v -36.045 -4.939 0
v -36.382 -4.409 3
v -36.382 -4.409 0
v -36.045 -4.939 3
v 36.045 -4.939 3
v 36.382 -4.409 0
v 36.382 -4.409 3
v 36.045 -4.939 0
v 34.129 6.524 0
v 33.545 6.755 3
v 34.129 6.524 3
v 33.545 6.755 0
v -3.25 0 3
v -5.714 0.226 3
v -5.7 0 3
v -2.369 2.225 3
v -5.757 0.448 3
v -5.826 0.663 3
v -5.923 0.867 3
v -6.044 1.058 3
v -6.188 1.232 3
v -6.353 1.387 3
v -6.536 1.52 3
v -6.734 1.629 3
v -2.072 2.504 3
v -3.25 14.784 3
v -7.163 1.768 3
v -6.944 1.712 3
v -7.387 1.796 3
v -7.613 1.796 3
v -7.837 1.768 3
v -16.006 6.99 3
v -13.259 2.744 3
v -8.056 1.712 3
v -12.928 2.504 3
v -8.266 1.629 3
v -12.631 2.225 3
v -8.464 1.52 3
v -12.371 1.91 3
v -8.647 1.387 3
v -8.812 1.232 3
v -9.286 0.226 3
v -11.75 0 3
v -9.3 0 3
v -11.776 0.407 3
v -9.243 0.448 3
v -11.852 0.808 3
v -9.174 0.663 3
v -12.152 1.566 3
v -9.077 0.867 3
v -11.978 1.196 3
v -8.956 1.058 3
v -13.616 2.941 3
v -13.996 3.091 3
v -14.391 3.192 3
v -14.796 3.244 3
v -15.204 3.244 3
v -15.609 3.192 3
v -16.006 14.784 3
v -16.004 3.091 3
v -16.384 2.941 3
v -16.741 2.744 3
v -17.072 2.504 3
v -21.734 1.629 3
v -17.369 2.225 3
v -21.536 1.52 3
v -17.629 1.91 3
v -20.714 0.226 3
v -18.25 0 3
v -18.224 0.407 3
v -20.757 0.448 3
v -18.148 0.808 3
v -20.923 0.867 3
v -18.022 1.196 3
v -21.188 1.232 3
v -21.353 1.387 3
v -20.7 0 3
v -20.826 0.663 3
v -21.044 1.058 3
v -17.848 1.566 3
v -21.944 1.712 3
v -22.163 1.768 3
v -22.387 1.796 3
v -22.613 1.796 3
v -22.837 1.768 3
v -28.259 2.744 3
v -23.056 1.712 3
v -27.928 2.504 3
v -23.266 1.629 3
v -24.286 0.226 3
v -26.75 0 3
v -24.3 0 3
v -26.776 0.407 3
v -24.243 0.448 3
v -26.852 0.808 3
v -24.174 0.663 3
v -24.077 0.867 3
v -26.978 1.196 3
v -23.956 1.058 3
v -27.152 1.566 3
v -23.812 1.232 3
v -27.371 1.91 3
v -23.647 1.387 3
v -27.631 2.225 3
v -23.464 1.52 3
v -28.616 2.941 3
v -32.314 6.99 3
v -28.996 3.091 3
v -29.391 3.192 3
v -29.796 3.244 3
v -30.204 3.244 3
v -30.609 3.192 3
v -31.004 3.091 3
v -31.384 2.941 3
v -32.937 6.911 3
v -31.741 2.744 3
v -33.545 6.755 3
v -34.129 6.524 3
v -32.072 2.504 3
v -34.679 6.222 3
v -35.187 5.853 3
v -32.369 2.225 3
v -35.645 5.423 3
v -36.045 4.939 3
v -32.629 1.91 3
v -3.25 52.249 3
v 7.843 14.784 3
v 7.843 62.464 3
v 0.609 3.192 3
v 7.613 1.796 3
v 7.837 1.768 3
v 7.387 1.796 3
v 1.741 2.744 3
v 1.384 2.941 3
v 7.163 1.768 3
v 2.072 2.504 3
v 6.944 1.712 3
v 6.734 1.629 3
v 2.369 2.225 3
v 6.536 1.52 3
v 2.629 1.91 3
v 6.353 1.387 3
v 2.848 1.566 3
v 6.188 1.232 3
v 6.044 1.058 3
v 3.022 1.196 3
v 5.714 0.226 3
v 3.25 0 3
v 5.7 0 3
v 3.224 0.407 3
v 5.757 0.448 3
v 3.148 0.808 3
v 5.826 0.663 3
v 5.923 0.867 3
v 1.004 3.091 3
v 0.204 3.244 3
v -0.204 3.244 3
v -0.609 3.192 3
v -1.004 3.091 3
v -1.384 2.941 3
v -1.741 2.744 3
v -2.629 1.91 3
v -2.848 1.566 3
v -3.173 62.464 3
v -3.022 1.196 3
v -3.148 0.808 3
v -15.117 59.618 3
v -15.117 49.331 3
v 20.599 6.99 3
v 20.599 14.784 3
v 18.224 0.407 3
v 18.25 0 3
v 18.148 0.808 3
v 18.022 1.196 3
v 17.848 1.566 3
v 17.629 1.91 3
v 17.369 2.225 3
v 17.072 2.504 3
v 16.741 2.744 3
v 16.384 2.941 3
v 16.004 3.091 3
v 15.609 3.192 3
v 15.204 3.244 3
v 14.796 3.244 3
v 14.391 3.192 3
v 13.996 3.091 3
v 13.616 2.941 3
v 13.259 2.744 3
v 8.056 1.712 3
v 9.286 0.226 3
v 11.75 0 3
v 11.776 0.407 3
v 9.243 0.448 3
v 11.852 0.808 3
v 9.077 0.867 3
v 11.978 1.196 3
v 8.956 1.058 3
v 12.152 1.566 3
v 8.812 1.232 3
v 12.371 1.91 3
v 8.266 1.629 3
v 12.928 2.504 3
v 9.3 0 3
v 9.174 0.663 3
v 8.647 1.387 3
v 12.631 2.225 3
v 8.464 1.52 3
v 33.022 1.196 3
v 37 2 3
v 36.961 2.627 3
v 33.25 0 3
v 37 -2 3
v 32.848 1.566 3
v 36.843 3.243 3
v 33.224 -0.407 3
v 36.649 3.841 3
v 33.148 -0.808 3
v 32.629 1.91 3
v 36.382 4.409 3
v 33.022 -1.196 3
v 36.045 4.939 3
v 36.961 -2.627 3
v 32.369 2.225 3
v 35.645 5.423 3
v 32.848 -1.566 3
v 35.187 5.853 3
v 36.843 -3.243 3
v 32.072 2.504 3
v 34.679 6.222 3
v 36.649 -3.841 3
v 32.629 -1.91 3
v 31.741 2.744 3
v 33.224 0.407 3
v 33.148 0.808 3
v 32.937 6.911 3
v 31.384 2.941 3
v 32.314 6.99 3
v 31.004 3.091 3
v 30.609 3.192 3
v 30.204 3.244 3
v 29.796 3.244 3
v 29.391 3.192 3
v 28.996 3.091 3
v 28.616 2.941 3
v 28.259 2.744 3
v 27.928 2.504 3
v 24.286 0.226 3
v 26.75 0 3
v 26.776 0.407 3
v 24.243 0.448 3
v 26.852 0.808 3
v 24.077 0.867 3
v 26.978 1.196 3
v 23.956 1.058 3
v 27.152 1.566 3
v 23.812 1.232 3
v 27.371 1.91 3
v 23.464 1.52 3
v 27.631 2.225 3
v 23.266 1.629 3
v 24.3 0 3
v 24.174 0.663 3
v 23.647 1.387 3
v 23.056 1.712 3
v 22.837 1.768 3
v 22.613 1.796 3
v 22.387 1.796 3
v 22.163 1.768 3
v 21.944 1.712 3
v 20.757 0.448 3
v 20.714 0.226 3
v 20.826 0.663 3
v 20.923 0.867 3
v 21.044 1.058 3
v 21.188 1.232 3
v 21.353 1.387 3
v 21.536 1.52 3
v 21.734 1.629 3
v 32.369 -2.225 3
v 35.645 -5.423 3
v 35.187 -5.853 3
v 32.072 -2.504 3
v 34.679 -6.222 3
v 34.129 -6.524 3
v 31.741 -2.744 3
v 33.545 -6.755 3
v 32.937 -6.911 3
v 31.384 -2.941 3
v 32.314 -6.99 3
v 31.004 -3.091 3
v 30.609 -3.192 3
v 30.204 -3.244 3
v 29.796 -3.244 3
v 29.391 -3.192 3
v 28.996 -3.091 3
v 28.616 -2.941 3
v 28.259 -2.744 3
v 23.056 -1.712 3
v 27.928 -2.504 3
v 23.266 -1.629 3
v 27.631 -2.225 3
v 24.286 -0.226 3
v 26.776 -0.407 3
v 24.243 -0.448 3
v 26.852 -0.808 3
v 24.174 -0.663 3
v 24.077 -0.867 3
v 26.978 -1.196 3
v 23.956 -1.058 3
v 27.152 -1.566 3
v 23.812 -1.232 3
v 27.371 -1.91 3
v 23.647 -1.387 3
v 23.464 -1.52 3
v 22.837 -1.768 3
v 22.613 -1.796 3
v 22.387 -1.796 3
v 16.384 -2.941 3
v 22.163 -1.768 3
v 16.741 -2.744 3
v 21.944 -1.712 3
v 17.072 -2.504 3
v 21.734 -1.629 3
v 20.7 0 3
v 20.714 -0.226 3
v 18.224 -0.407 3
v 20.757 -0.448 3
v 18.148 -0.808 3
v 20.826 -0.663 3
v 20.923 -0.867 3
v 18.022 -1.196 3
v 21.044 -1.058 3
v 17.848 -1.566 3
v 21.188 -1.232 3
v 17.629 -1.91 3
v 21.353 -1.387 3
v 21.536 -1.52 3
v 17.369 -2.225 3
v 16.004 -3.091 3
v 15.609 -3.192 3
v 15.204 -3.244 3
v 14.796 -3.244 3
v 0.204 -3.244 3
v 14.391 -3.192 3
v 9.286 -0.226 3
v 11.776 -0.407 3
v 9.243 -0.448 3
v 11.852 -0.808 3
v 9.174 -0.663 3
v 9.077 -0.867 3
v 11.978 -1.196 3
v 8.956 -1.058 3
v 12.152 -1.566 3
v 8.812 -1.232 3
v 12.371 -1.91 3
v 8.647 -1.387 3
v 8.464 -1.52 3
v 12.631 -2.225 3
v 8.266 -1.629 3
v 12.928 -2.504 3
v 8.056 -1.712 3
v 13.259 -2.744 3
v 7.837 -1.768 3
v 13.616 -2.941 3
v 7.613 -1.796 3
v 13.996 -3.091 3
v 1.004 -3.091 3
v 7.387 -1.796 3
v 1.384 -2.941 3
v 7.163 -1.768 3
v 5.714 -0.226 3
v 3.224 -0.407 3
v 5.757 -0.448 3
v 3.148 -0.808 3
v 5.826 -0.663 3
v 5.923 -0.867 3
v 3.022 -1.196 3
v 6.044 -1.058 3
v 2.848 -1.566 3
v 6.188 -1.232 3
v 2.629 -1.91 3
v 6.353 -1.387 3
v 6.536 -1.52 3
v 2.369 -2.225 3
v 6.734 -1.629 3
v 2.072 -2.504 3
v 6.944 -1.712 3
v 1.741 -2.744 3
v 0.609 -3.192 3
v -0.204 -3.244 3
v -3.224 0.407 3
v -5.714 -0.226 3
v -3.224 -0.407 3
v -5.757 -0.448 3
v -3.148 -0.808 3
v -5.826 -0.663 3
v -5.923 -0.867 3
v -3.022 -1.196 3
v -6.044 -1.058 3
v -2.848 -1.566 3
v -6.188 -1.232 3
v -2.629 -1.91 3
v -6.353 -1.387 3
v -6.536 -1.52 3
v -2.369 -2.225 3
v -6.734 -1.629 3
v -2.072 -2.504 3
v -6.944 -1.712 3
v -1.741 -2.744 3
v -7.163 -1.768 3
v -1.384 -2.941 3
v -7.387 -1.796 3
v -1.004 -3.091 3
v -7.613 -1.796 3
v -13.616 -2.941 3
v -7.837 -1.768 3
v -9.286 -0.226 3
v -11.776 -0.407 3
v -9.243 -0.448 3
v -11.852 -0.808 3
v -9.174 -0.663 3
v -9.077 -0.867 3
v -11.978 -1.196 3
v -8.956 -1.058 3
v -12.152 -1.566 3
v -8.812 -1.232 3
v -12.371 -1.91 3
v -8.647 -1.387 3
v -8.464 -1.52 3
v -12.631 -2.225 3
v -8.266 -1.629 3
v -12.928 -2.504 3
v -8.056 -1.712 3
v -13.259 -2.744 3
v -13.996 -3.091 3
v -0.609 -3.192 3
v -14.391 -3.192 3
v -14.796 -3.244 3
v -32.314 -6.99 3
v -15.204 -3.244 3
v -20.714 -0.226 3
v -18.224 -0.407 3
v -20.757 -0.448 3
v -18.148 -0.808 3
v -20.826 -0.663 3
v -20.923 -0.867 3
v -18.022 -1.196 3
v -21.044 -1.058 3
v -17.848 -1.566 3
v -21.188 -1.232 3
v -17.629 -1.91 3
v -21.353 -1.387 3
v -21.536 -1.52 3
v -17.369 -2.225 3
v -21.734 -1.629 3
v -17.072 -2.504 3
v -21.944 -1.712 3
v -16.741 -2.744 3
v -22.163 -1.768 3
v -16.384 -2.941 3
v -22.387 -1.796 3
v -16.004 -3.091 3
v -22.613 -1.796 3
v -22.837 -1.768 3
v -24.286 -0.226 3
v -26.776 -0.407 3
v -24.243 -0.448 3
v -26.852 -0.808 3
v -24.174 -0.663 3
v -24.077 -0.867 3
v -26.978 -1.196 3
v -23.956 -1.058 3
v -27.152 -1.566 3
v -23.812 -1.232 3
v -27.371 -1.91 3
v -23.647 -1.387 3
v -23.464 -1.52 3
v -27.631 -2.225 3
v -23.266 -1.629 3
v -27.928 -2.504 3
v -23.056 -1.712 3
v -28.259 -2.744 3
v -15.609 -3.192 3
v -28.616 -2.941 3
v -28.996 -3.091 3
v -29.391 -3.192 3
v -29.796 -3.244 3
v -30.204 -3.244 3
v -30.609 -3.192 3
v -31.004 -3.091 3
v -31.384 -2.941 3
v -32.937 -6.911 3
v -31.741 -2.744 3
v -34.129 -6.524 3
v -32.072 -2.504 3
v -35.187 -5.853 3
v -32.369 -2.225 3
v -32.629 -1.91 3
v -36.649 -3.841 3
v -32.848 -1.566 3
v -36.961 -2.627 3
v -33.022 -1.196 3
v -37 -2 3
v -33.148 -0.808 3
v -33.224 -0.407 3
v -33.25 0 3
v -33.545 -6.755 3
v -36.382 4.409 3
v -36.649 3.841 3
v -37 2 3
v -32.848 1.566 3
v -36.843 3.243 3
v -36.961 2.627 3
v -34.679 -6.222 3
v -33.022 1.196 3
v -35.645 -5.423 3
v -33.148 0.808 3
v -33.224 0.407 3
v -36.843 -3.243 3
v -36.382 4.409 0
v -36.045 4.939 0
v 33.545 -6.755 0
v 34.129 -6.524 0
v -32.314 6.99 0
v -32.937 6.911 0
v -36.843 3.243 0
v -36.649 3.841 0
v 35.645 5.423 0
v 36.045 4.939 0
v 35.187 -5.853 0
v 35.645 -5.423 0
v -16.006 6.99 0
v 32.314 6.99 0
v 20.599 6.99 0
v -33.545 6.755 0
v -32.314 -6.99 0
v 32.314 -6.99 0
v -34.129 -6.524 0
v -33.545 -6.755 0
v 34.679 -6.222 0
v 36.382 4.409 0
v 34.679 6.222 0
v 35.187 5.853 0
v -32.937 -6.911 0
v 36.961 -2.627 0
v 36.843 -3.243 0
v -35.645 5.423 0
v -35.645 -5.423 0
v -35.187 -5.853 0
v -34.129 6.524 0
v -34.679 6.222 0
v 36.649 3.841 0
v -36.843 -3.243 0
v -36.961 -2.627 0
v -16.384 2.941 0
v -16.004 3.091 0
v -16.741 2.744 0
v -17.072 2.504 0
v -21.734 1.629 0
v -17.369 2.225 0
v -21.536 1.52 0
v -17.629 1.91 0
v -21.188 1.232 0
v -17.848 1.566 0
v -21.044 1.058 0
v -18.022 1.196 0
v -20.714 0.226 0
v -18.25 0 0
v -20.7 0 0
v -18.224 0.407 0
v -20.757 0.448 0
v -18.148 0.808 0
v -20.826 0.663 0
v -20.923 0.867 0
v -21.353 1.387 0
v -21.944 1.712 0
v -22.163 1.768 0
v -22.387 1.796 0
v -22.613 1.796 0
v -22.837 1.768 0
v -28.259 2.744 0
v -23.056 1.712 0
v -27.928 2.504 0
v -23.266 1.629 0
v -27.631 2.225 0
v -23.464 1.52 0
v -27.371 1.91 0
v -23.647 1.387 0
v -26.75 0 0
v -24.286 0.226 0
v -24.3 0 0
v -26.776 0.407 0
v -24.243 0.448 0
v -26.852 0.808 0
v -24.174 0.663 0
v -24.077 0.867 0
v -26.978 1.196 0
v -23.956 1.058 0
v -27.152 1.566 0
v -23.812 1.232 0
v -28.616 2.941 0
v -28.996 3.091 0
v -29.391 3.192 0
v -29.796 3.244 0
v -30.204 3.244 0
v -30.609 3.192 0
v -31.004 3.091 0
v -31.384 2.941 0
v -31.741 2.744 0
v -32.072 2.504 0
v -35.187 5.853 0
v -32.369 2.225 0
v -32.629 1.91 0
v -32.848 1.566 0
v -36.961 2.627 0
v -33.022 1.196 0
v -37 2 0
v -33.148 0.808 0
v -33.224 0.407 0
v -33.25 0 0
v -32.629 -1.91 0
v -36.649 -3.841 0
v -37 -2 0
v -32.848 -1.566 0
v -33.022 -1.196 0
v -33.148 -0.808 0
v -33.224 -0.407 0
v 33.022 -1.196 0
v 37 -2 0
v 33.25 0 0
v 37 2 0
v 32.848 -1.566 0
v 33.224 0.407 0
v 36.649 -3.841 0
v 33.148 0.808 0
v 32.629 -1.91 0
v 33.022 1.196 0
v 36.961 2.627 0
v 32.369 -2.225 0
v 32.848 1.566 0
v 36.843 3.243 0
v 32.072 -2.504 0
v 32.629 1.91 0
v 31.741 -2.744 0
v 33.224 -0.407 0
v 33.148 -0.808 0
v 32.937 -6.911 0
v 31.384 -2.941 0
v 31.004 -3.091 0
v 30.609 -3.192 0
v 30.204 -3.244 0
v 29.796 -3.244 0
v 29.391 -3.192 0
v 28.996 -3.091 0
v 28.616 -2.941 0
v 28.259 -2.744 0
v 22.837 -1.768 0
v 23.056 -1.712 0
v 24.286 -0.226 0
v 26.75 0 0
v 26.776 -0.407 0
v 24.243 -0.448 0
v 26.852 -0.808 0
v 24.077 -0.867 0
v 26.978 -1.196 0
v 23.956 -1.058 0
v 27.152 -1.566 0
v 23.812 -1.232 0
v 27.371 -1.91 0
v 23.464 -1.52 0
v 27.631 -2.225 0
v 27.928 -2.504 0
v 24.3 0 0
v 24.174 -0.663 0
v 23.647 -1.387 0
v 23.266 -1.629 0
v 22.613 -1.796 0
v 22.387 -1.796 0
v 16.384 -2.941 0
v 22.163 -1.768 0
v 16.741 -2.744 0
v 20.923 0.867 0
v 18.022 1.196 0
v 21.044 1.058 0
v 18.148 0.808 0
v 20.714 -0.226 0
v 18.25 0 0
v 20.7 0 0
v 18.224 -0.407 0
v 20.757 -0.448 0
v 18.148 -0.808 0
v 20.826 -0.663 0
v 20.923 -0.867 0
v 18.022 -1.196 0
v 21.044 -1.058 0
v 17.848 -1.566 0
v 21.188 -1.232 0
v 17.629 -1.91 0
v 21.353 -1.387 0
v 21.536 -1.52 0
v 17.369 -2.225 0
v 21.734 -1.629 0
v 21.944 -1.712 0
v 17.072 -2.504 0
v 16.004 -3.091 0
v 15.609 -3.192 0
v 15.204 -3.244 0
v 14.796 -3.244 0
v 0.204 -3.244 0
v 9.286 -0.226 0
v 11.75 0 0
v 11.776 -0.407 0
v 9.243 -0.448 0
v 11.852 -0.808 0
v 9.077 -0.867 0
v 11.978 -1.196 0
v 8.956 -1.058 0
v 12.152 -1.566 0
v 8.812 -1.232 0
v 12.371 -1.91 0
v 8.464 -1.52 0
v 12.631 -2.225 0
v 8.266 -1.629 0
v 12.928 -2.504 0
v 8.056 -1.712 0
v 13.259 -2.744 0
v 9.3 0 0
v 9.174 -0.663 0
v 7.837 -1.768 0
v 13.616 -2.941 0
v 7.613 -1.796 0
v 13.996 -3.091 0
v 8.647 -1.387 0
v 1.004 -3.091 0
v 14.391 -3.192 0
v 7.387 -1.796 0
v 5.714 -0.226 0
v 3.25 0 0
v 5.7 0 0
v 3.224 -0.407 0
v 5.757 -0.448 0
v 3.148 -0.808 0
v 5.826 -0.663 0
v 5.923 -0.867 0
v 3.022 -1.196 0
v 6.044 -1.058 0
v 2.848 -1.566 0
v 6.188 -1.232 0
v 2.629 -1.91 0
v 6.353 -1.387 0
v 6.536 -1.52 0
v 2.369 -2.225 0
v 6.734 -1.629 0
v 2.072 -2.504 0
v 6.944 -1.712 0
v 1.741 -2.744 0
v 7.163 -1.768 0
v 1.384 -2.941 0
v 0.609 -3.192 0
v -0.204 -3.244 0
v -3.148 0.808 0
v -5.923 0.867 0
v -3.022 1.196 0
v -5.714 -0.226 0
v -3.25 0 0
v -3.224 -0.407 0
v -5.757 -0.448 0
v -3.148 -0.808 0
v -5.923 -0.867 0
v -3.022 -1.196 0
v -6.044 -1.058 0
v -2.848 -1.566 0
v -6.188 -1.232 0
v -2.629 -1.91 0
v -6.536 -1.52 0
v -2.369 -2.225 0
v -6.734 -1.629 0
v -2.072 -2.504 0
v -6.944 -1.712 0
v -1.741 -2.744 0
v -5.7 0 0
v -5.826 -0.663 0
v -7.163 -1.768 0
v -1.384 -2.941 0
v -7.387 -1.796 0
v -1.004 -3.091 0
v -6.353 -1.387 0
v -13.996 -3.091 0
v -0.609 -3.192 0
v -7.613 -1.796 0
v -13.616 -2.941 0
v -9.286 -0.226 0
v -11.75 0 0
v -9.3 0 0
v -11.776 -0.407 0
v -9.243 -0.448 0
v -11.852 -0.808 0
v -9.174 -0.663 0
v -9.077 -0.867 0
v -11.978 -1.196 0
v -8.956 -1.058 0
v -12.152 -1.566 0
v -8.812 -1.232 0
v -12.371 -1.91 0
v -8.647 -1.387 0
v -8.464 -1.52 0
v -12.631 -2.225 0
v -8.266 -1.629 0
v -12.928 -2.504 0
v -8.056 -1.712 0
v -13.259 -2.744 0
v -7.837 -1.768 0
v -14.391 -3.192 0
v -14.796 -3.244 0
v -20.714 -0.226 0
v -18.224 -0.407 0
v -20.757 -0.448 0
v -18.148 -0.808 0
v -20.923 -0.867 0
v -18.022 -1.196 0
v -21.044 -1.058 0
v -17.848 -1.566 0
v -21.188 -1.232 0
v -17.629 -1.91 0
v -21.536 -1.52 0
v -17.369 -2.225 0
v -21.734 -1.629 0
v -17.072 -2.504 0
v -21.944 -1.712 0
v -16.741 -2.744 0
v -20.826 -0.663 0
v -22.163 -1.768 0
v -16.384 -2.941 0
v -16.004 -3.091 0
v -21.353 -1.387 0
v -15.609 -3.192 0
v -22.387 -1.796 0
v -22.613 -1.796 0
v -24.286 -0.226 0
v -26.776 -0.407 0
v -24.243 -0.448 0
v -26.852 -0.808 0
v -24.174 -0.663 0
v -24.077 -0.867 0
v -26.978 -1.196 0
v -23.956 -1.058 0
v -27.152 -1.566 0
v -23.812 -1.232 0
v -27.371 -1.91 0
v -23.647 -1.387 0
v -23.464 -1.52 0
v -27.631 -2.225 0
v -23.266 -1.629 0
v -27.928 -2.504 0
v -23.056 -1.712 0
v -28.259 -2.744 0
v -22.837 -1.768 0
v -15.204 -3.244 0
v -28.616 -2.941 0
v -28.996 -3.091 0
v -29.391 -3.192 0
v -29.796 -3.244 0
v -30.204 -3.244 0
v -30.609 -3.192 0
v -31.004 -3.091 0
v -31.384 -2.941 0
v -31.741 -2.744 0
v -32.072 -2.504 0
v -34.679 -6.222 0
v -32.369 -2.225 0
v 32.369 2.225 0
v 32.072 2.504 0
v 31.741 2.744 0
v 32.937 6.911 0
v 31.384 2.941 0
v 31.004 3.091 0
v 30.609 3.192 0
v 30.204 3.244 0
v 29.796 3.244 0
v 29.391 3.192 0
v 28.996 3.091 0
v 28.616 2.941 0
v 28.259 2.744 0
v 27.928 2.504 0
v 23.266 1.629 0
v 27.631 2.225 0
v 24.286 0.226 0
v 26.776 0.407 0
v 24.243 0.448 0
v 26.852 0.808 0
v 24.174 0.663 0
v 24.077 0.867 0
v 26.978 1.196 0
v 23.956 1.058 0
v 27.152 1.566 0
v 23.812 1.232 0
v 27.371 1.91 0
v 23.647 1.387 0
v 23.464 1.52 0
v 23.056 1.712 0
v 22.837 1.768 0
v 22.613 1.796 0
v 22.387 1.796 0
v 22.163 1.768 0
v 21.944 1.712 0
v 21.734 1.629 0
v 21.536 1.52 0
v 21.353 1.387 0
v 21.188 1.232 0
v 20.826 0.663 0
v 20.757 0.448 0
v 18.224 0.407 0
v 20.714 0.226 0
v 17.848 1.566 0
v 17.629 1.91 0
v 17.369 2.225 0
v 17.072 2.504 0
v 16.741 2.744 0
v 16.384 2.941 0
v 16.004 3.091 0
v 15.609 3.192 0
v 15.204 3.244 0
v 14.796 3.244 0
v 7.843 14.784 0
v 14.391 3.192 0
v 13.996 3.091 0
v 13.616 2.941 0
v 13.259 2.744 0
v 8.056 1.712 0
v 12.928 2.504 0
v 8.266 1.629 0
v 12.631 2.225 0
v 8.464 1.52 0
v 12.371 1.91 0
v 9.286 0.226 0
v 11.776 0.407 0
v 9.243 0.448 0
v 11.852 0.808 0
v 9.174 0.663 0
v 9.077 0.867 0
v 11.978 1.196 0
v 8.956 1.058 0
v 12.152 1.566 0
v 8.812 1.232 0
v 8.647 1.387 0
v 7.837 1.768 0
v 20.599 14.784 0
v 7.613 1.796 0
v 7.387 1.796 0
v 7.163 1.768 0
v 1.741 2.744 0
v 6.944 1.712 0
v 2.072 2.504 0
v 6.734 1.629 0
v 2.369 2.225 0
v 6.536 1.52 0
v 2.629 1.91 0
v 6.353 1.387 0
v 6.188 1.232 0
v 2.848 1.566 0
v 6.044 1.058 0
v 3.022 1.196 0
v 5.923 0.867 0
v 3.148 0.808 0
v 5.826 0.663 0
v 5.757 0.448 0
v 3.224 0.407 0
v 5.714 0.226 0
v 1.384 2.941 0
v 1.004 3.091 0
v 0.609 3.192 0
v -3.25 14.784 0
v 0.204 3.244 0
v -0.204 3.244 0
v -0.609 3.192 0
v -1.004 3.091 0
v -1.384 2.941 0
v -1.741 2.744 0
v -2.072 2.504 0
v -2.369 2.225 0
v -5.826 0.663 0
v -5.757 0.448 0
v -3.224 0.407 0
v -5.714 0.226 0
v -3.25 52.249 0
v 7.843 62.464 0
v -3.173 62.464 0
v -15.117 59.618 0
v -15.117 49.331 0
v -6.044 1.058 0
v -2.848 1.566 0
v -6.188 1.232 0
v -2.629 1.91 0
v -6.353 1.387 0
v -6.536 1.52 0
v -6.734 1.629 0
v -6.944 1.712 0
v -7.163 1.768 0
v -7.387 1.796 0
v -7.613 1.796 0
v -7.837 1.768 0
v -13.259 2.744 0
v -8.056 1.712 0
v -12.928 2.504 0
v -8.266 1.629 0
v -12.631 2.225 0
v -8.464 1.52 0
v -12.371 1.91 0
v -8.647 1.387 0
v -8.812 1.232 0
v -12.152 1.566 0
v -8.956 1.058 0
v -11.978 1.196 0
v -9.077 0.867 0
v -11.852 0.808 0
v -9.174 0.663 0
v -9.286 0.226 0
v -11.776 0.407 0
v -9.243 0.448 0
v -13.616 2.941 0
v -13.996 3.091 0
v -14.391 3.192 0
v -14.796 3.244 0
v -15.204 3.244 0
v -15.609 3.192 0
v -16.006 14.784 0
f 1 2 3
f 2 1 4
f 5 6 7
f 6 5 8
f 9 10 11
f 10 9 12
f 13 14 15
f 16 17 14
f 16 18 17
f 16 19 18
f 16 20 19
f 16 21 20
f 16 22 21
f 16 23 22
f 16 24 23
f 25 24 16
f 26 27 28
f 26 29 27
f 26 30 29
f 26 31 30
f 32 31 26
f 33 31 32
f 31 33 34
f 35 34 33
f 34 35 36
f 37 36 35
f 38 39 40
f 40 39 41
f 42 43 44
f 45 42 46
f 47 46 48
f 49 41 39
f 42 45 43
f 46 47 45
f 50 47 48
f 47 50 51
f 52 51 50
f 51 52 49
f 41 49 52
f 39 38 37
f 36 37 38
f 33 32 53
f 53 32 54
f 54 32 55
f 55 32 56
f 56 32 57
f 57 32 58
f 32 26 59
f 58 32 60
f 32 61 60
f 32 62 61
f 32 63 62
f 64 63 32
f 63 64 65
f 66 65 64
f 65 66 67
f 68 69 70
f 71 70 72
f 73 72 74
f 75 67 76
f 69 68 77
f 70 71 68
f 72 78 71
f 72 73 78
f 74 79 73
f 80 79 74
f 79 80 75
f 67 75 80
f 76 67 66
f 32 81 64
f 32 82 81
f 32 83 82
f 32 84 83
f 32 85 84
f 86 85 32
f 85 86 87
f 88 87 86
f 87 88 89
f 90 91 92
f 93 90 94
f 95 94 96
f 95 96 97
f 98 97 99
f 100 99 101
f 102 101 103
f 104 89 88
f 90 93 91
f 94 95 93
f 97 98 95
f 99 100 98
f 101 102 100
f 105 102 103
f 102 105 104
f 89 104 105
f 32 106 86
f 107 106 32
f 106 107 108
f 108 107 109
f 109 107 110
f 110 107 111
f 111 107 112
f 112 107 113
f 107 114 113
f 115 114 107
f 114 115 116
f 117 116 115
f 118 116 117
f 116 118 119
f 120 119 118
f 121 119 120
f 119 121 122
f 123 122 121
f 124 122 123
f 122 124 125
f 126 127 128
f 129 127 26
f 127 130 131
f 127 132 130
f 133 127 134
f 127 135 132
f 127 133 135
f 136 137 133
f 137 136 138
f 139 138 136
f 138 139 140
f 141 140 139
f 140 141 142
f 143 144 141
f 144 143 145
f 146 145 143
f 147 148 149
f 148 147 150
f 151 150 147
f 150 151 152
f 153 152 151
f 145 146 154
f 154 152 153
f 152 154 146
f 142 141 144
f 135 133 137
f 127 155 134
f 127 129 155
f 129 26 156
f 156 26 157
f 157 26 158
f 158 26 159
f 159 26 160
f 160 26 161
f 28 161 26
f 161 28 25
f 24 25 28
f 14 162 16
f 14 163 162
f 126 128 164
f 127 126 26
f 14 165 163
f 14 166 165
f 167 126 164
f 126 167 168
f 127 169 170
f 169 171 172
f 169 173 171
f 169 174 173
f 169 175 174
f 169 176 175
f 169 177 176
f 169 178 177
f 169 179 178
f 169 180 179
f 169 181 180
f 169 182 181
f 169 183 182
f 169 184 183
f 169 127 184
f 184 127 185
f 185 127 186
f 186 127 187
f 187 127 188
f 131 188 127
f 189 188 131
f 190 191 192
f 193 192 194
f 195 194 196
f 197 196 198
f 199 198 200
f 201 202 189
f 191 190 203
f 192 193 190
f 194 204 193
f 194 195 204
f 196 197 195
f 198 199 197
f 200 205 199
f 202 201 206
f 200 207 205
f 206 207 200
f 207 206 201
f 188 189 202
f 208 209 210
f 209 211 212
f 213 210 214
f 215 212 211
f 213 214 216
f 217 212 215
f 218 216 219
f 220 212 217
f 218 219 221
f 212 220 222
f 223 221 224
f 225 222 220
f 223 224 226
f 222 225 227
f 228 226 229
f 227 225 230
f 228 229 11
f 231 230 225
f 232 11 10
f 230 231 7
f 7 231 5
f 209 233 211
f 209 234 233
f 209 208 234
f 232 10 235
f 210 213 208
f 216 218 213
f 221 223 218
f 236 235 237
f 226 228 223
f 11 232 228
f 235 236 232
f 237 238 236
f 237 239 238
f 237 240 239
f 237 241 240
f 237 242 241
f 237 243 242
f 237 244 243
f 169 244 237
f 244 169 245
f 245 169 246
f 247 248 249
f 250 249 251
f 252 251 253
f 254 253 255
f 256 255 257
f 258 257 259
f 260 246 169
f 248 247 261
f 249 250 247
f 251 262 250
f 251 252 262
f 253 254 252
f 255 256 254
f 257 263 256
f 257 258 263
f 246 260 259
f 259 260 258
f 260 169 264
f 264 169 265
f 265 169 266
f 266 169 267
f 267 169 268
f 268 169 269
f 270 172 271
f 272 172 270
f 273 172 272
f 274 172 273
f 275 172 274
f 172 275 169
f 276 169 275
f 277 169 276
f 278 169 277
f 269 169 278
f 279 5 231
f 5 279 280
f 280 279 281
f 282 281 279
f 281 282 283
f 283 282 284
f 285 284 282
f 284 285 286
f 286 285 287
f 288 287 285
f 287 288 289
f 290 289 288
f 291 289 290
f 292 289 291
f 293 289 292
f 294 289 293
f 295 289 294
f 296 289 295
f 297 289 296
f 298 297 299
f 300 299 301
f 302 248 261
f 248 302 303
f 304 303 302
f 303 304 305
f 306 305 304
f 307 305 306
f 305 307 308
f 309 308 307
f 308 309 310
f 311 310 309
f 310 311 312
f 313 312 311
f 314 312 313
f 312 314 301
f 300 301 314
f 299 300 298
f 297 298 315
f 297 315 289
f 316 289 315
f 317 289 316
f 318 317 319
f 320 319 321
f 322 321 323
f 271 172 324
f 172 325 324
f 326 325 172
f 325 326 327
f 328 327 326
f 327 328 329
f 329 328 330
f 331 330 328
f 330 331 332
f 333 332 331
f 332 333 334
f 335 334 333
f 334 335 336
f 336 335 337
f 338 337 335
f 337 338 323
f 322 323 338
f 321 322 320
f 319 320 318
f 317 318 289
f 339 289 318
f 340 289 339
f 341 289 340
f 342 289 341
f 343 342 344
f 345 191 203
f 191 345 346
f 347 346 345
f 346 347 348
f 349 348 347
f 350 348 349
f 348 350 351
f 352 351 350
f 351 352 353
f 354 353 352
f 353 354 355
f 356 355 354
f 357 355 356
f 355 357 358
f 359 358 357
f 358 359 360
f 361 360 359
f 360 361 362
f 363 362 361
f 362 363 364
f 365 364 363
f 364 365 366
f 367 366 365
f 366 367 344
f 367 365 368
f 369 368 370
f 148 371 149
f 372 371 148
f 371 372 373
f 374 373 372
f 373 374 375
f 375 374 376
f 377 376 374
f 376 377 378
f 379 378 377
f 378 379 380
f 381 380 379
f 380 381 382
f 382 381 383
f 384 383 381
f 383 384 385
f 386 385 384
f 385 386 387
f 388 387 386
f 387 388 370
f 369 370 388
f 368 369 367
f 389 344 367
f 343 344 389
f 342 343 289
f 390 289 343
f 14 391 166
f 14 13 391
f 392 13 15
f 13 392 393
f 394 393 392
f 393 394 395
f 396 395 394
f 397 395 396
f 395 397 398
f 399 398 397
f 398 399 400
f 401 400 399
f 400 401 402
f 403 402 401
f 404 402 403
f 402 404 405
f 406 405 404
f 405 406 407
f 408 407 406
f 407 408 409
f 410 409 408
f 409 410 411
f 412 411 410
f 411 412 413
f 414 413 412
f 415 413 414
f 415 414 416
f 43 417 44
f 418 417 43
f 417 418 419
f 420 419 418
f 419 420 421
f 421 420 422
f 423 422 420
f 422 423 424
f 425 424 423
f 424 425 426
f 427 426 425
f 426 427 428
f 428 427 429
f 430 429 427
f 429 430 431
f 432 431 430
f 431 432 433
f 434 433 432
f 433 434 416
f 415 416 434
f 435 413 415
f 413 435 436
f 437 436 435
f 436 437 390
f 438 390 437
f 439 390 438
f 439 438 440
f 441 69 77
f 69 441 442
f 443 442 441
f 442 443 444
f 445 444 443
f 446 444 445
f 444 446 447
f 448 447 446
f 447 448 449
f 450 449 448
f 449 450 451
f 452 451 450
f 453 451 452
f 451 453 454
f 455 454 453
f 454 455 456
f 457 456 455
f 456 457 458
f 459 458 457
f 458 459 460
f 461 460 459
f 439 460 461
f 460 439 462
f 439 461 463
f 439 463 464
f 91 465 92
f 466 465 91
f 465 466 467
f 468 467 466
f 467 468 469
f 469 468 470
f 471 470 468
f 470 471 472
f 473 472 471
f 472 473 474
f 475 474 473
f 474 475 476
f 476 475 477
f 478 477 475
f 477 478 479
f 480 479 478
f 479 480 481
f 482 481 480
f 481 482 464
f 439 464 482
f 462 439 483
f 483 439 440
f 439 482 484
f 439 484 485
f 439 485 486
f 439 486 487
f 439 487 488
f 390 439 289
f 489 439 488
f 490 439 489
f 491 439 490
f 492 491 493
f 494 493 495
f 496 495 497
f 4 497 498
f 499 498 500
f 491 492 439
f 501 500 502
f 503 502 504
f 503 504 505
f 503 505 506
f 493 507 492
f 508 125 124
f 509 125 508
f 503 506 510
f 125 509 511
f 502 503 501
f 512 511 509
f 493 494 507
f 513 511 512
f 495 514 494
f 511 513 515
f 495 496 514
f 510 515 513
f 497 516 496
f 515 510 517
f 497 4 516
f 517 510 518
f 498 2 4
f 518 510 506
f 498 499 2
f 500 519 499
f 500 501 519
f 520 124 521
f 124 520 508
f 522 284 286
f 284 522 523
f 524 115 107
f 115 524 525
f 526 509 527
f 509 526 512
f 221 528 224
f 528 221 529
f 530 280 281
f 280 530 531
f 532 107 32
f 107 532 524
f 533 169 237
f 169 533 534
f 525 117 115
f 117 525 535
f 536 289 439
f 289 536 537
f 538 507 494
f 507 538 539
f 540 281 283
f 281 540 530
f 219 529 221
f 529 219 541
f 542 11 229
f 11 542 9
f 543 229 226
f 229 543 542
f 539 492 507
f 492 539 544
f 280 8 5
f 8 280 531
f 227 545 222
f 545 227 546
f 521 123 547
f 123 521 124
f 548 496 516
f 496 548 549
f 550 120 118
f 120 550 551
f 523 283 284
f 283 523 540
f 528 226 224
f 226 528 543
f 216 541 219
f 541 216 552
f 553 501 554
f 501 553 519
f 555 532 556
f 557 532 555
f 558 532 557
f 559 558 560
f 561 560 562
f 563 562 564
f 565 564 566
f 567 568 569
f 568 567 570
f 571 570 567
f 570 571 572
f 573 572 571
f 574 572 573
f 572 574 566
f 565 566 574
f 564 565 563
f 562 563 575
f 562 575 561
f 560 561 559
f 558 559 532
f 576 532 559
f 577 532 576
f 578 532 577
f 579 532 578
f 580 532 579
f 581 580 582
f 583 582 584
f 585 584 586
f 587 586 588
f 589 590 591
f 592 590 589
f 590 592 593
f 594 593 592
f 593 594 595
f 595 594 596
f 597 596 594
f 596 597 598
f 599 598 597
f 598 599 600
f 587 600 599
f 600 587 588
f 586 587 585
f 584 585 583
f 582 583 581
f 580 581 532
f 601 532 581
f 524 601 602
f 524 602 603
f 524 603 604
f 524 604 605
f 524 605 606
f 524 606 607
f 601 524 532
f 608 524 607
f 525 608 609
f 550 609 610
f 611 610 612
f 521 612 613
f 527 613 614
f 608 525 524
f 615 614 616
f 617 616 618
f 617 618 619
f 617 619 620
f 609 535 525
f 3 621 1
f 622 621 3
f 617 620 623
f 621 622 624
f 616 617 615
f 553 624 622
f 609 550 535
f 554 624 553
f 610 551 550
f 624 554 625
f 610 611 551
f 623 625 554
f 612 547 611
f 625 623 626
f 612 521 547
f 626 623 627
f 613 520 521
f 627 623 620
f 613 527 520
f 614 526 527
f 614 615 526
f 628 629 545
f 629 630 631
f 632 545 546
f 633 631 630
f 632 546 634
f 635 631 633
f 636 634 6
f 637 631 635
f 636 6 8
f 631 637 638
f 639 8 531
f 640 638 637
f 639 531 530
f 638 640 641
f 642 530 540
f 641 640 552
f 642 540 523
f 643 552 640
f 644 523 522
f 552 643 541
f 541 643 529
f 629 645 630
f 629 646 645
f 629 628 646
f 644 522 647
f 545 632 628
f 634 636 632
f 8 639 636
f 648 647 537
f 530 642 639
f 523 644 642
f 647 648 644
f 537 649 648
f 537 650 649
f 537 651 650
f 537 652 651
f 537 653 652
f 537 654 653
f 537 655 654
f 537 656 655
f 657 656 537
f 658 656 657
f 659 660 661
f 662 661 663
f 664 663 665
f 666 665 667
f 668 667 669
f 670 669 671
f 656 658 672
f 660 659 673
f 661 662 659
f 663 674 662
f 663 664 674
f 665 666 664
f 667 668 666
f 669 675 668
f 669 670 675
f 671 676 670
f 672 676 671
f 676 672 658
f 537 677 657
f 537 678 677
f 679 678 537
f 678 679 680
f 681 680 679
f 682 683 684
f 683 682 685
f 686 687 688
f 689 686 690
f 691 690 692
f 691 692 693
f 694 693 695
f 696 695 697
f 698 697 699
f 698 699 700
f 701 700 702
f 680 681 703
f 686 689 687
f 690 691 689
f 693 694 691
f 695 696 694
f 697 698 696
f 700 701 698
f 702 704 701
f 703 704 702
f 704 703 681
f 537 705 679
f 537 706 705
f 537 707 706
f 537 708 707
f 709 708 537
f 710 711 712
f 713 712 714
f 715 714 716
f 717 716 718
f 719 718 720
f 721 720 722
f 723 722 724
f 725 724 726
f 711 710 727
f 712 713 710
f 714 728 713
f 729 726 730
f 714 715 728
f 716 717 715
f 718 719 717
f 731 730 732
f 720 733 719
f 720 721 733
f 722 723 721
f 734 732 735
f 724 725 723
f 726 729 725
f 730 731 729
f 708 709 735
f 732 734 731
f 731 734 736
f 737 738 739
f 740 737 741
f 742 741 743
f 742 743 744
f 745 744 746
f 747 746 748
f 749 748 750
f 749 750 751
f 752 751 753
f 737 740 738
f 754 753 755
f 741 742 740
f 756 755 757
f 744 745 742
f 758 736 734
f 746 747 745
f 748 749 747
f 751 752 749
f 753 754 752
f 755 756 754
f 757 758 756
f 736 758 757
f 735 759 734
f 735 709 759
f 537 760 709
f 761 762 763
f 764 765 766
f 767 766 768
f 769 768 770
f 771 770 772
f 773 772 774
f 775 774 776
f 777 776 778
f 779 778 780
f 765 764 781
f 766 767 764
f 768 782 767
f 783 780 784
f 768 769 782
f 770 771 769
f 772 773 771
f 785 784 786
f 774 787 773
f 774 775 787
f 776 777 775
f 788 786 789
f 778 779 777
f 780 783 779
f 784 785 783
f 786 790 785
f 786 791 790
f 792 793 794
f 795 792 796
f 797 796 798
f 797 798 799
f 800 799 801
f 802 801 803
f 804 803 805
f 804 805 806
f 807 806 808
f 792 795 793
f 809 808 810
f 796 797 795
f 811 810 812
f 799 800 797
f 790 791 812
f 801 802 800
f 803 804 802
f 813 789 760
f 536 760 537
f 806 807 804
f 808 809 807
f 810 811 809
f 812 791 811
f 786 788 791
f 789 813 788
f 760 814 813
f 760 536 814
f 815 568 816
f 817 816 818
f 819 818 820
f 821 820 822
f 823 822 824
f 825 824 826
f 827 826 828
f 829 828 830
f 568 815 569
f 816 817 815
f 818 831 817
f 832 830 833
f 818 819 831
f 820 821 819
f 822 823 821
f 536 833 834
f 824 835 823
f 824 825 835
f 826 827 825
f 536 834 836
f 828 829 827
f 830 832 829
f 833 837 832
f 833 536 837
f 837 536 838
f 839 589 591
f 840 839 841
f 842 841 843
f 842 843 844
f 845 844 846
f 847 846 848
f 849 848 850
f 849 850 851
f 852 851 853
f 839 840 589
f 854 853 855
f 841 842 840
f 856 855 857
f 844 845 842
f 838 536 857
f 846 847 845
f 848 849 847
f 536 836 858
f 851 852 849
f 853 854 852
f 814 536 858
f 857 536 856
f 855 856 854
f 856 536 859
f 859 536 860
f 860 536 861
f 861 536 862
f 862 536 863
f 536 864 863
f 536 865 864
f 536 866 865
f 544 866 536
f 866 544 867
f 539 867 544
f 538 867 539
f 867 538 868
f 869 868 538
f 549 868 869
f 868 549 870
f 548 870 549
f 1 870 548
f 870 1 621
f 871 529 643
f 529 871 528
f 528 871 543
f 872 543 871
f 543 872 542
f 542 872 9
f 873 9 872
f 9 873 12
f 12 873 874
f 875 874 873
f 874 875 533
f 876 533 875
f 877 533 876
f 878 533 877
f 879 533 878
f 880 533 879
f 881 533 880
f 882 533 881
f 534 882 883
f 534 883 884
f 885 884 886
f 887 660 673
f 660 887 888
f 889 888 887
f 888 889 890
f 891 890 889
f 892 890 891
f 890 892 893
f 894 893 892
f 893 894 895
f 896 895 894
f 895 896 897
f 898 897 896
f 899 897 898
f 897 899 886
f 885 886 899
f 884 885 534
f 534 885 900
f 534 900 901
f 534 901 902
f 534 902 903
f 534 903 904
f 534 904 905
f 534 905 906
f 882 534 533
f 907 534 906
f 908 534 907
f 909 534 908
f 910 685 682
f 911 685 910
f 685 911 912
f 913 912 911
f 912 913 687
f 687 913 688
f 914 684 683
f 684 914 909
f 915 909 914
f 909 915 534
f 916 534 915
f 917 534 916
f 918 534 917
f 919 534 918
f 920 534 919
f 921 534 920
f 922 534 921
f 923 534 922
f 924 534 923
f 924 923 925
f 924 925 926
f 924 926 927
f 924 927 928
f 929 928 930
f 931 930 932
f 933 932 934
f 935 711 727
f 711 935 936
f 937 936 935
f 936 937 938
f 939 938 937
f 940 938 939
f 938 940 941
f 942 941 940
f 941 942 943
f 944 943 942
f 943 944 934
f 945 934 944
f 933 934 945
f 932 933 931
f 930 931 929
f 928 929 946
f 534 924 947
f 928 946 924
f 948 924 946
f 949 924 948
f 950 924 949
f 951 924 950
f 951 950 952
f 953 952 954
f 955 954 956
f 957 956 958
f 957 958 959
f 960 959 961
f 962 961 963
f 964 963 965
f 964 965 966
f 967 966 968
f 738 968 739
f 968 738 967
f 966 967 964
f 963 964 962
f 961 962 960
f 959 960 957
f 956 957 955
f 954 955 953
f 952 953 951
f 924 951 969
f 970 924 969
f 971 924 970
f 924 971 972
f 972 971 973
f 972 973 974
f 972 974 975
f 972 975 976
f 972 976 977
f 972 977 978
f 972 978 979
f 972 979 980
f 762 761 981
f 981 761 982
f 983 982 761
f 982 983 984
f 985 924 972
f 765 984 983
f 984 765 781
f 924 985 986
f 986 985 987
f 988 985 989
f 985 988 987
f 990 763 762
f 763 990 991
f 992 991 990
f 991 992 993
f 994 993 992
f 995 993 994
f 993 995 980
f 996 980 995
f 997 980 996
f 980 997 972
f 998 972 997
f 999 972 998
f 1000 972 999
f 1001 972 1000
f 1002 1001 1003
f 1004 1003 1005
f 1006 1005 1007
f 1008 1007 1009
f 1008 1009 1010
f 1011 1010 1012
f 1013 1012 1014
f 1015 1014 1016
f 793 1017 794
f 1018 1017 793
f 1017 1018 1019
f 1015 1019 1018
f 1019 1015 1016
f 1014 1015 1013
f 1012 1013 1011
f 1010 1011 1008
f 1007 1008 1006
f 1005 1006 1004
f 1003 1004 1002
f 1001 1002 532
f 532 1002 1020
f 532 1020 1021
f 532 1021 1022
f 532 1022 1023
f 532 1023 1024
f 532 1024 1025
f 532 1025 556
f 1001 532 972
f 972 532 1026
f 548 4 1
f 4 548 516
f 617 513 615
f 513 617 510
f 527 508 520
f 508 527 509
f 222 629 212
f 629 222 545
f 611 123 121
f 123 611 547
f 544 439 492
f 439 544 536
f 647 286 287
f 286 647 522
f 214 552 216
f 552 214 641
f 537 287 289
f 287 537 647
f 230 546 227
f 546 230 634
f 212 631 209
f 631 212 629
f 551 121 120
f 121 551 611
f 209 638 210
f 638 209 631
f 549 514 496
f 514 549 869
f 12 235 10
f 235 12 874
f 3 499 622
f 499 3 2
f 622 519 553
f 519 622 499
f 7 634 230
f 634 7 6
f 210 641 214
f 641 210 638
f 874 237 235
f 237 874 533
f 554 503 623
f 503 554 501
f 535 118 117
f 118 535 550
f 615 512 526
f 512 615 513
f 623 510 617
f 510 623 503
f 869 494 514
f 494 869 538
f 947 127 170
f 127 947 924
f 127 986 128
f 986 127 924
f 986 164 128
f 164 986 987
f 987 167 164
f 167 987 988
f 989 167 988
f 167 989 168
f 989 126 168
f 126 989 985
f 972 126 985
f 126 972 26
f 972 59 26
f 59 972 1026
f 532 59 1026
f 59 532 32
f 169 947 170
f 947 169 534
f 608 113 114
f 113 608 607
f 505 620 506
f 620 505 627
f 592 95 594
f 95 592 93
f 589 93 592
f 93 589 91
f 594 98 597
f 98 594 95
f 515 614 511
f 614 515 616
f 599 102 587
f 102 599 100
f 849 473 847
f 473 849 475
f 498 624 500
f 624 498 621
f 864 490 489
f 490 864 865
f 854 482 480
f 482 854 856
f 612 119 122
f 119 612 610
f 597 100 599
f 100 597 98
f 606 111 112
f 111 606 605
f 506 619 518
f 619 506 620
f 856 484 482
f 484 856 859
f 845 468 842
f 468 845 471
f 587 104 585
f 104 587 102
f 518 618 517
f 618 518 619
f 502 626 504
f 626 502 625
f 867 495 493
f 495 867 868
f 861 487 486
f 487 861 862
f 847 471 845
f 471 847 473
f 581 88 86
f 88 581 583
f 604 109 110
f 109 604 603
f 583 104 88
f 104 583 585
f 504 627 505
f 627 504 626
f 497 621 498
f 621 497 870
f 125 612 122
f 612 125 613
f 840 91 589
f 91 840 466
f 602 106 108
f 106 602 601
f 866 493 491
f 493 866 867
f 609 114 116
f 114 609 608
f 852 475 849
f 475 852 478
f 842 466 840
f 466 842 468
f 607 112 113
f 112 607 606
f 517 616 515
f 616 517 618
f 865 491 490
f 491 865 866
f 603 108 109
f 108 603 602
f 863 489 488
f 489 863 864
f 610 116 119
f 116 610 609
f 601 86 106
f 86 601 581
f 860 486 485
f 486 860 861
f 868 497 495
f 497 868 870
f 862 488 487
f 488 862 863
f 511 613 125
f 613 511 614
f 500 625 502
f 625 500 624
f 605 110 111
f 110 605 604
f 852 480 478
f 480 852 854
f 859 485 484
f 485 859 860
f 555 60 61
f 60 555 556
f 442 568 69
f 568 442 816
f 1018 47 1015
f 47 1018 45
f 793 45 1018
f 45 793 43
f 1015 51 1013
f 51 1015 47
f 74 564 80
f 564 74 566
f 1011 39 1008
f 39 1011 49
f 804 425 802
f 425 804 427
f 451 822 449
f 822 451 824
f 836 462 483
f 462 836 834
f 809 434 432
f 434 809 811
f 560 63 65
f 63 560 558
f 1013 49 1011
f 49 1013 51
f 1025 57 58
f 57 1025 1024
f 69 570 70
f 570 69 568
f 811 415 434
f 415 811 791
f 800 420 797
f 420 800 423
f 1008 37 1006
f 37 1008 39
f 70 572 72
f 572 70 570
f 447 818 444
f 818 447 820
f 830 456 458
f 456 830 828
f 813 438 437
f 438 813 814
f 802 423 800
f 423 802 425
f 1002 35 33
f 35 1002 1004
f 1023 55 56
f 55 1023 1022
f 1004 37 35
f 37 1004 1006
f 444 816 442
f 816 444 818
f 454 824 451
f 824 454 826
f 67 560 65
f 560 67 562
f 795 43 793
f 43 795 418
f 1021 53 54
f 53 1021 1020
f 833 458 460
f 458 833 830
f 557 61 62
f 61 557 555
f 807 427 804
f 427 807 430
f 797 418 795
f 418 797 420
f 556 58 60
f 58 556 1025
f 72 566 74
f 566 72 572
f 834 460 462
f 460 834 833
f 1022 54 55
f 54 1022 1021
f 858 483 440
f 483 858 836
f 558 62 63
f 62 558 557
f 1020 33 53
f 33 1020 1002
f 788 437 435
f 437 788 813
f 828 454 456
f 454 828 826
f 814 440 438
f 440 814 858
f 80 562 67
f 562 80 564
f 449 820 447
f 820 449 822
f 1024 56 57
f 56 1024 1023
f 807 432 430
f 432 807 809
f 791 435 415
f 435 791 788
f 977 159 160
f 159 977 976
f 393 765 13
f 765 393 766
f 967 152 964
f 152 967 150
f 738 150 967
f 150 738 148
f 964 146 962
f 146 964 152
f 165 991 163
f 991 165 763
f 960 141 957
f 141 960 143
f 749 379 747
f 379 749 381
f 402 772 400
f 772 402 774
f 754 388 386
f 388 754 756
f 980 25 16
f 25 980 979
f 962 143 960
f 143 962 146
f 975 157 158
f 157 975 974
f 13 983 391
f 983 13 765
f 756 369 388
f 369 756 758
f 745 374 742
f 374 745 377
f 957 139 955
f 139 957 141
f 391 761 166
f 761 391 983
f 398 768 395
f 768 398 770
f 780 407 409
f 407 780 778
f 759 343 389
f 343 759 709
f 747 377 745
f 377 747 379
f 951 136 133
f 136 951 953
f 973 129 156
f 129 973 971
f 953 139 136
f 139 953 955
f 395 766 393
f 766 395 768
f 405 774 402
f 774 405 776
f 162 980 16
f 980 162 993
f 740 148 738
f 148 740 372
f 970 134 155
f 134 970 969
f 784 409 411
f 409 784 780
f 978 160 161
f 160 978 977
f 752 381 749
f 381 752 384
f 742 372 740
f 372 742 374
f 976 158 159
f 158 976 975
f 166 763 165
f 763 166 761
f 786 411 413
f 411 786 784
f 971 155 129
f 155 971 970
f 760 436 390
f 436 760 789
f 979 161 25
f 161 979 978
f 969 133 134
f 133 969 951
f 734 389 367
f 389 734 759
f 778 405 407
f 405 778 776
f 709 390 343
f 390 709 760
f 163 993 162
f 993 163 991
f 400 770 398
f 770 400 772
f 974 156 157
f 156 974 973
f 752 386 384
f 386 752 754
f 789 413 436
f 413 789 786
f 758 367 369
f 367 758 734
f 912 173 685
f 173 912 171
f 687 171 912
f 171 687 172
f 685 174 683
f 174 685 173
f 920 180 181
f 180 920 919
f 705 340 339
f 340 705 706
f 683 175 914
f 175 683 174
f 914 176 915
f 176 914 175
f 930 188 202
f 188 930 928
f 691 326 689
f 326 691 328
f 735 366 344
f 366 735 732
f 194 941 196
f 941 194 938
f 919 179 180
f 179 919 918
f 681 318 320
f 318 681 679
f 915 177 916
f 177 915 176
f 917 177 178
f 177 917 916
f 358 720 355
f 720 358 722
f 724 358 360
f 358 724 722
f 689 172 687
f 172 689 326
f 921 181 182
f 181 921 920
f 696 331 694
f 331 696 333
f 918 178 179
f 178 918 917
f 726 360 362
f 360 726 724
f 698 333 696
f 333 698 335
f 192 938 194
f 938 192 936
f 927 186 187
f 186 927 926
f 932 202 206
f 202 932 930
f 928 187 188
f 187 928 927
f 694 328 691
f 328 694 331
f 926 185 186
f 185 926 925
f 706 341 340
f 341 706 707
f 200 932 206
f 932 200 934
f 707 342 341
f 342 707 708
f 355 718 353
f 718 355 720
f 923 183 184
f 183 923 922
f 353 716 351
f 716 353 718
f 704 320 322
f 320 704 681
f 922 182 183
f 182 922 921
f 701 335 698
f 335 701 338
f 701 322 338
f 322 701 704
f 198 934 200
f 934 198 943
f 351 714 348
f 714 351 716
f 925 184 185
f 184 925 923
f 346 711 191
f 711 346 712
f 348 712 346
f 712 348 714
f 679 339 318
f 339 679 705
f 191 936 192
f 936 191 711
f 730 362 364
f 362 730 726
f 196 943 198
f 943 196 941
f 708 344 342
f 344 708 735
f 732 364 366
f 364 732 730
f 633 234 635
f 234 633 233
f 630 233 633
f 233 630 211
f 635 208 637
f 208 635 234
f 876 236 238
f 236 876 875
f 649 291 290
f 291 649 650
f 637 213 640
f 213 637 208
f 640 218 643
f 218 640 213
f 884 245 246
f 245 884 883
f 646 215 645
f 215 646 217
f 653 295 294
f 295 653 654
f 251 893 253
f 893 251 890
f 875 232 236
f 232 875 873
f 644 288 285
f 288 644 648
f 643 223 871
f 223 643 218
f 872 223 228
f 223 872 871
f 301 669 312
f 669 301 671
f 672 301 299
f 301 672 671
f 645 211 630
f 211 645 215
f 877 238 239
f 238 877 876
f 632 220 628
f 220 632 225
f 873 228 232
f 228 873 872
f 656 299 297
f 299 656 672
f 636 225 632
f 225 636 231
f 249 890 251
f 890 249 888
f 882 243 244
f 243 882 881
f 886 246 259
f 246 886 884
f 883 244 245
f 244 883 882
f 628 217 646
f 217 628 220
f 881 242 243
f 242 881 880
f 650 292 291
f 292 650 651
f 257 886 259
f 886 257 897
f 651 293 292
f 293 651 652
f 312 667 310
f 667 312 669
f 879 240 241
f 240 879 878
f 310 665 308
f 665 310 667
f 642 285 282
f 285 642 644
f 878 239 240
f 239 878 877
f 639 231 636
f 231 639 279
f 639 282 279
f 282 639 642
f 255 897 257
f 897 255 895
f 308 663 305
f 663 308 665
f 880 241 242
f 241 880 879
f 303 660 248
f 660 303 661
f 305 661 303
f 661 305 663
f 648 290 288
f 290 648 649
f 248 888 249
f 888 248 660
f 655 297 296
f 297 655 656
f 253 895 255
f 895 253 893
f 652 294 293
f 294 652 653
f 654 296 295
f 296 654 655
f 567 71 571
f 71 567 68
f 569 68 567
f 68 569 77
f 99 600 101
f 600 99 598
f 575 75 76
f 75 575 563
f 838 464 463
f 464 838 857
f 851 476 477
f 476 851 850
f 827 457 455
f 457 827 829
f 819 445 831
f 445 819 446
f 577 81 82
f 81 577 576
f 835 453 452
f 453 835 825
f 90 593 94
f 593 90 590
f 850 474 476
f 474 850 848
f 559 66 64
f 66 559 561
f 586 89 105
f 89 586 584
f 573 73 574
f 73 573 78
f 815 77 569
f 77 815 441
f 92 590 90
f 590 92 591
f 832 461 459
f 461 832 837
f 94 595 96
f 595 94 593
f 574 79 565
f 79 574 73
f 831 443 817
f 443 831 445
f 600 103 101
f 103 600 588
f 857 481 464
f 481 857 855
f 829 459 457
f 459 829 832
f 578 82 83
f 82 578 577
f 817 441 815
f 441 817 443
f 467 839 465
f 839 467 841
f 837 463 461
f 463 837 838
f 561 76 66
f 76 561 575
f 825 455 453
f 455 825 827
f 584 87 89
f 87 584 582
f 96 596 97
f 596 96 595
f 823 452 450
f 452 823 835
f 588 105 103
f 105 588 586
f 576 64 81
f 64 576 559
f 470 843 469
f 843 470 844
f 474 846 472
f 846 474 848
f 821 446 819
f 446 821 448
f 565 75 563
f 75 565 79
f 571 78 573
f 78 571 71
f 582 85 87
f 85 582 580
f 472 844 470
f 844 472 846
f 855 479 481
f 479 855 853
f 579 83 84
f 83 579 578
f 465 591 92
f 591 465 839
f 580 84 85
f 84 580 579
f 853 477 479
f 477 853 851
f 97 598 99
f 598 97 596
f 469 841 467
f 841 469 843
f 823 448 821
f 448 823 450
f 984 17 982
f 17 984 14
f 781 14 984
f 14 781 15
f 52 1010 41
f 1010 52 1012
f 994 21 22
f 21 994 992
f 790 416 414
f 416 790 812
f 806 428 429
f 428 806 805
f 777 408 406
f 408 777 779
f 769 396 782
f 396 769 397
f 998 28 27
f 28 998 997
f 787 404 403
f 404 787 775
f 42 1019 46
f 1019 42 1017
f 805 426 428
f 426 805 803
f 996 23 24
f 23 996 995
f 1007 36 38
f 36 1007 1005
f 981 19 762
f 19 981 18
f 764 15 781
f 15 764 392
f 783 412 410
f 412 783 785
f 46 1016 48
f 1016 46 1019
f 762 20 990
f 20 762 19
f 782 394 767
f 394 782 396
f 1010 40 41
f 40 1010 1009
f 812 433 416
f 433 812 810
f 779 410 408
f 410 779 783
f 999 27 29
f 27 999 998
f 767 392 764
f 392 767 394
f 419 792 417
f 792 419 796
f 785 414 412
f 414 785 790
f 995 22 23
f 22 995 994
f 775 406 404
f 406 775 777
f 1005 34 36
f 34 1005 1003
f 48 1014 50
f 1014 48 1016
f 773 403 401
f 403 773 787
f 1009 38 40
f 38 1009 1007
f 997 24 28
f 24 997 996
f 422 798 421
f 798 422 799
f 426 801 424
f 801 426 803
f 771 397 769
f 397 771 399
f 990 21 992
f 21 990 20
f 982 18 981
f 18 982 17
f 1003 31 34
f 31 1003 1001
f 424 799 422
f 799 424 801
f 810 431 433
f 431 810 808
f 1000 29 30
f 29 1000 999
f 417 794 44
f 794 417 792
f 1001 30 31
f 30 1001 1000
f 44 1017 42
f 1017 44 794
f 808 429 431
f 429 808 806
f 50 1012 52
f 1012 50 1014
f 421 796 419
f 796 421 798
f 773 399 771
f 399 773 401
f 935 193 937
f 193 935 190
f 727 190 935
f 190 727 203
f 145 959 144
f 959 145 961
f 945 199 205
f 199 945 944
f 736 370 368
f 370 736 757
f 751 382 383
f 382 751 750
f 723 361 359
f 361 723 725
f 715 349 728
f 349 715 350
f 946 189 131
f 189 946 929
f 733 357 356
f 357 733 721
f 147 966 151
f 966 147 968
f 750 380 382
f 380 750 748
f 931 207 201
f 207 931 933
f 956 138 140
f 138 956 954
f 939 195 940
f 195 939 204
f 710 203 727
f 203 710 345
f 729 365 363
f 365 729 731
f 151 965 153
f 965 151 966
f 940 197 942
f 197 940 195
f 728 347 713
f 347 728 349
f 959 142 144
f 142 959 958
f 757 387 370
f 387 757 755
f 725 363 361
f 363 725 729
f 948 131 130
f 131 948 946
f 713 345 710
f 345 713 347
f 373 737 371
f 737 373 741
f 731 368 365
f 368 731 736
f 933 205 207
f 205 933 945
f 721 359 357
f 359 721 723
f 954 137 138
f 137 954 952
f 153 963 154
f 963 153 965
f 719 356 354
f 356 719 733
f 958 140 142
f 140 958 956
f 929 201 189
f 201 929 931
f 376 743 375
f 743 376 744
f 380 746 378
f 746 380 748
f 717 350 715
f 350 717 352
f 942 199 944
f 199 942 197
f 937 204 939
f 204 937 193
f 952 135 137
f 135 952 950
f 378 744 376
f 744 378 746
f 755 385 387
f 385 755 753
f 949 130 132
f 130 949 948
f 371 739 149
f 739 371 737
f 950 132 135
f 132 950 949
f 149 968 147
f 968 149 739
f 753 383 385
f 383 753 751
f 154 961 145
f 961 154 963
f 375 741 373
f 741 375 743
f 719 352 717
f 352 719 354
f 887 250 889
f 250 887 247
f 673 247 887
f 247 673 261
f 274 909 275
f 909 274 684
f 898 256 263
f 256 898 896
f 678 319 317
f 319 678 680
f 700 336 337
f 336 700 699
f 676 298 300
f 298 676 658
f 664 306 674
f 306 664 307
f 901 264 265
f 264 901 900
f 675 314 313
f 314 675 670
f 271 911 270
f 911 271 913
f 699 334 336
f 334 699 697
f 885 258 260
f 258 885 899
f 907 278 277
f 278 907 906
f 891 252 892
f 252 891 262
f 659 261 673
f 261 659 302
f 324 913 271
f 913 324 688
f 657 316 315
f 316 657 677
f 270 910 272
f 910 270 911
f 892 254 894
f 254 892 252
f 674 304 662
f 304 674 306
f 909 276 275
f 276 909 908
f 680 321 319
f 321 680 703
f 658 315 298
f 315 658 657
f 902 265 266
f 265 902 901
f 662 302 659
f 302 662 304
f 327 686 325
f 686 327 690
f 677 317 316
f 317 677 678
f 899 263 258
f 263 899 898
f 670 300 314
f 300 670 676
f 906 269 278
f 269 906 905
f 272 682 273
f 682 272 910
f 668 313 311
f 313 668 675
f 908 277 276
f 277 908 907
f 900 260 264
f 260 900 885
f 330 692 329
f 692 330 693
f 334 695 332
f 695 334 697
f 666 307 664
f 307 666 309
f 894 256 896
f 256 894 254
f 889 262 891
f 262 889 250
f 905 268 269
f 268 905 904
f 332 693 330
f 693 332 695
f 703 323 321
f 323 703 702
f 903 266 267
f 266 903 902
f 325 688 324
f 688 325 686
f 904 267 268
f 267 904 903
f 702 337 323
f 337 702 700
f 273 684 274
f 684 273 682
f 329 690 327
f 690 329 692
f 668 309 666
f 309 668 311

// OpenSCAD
$fn = 50;


difference() {
	union() {
		hull() {
			translate(v = [-32.0000000000, 2.0000000000, 0]) {
				cylinder(h = 3, r = 5);
			}
			translate(v = [32.0000000000, 2.0000000000, 0]) {
				cylinder(h = 3, r = 5);
			}
			translate(v = [-32.0000000000, -2.0000000000, 0]) {
				cylinder(h = 3, r = 5);
			}
			translate(v = [32.0000000000, -2.0000000000, 0]) {
				cylinder(h = 3, r = 5);
			}
		}
		translate(v = [0, 61.1111111111, 0]) {
			linear_extrude(height = 3) {
				text(font = "DejaVu Sans Mono:style=Bold", halign = "center", size = 57.0000000000, text = "1", valign = "top");
			}
		}
	}
	union() {
		translate(v = [-30.0000000000, 0.0000000000, 0]) {
			translate(v = [0, 0, -100]) {
				cylinder(h = 200, r = 3.2500000000);
			}
		}
		translate(v = [-15.0000000000, 0.0000000000, 0]) {
			translate(v = [0, 0, -100]) {
				cylinder(h = 200, r = 3.2500000000);
			}
		}
		translate(v = [0, 0, -100]) {
			cylinder(h = 200, r = 3.2500000000);
		}
		translate(v = [15.0000000000, 0.0000000000, 0]) {
			translate(v = [0, 0, -100]) {
				cylinder(h = 200, r = 3.2500000000);
			}
		}
		translate(v = [30.0000000000, 0.0000000000, 0]) {
			translate(v = [0, 0, -100]) {
				cylinder(h = 200, r = 3.2500000000);
			}
		}
		translate(v = [-30.0000000000, 0.0000000000, 0]) {
			translate(v = [0, 0, -100]) {
				cylinder(h = 200, r = 1.8000000000);
			}
		}
		translate(v = [-22.5000000000, 0.0000000000, 0]) {
			translate(v = [0, 0, -100]) {
				cylinder(h = 200, r = 1.8000000000);
			}
		}
		translate(v = [-15.0000000000, 0.0000000000, 0]) {
			translate(v = [0, 0, -100]) {
				cylinder(h = 200, r = 1.8000000000);
			}
		}
		translate(v = [-7.5000000000, 0.0000000000, 0]) {
			translate(v = [0, 0, -100]) {
				cylinder(h = 200, r = 1.8000000000);
			}
		}
		translate(v = [0, 0, -100]) {
			cylinder(h = 200, r = 1.8000000000);
		}
		translate(v = [7.5000000000, 0.0000000000, 0]) {
			translate(v = [0, 0, -100]) {
				cylinder(h = 200, r = 1.8000000000);
			}
		}
		translate(v = [15.0000000000, 0.0000000000, 0]) {
			translate(v = [0, 0, -100]) {
				cylinder(h = 200, r = 1.8000000000);
			}
		}
		translate(v = [22.5000000000, 0.0000000000, 0]) {
			translate(v = [0, 0, -100]) {
				cylinder(h = 200, r = 1.8000000000);
			}
		}
		translate(v = [30.0000000000, 0.0000000000, 0]) {
			translate(v = [0, 0, -100]) {
				cylinder(h = 200, r = 1.8000000000);
			}
		}
	}
}
